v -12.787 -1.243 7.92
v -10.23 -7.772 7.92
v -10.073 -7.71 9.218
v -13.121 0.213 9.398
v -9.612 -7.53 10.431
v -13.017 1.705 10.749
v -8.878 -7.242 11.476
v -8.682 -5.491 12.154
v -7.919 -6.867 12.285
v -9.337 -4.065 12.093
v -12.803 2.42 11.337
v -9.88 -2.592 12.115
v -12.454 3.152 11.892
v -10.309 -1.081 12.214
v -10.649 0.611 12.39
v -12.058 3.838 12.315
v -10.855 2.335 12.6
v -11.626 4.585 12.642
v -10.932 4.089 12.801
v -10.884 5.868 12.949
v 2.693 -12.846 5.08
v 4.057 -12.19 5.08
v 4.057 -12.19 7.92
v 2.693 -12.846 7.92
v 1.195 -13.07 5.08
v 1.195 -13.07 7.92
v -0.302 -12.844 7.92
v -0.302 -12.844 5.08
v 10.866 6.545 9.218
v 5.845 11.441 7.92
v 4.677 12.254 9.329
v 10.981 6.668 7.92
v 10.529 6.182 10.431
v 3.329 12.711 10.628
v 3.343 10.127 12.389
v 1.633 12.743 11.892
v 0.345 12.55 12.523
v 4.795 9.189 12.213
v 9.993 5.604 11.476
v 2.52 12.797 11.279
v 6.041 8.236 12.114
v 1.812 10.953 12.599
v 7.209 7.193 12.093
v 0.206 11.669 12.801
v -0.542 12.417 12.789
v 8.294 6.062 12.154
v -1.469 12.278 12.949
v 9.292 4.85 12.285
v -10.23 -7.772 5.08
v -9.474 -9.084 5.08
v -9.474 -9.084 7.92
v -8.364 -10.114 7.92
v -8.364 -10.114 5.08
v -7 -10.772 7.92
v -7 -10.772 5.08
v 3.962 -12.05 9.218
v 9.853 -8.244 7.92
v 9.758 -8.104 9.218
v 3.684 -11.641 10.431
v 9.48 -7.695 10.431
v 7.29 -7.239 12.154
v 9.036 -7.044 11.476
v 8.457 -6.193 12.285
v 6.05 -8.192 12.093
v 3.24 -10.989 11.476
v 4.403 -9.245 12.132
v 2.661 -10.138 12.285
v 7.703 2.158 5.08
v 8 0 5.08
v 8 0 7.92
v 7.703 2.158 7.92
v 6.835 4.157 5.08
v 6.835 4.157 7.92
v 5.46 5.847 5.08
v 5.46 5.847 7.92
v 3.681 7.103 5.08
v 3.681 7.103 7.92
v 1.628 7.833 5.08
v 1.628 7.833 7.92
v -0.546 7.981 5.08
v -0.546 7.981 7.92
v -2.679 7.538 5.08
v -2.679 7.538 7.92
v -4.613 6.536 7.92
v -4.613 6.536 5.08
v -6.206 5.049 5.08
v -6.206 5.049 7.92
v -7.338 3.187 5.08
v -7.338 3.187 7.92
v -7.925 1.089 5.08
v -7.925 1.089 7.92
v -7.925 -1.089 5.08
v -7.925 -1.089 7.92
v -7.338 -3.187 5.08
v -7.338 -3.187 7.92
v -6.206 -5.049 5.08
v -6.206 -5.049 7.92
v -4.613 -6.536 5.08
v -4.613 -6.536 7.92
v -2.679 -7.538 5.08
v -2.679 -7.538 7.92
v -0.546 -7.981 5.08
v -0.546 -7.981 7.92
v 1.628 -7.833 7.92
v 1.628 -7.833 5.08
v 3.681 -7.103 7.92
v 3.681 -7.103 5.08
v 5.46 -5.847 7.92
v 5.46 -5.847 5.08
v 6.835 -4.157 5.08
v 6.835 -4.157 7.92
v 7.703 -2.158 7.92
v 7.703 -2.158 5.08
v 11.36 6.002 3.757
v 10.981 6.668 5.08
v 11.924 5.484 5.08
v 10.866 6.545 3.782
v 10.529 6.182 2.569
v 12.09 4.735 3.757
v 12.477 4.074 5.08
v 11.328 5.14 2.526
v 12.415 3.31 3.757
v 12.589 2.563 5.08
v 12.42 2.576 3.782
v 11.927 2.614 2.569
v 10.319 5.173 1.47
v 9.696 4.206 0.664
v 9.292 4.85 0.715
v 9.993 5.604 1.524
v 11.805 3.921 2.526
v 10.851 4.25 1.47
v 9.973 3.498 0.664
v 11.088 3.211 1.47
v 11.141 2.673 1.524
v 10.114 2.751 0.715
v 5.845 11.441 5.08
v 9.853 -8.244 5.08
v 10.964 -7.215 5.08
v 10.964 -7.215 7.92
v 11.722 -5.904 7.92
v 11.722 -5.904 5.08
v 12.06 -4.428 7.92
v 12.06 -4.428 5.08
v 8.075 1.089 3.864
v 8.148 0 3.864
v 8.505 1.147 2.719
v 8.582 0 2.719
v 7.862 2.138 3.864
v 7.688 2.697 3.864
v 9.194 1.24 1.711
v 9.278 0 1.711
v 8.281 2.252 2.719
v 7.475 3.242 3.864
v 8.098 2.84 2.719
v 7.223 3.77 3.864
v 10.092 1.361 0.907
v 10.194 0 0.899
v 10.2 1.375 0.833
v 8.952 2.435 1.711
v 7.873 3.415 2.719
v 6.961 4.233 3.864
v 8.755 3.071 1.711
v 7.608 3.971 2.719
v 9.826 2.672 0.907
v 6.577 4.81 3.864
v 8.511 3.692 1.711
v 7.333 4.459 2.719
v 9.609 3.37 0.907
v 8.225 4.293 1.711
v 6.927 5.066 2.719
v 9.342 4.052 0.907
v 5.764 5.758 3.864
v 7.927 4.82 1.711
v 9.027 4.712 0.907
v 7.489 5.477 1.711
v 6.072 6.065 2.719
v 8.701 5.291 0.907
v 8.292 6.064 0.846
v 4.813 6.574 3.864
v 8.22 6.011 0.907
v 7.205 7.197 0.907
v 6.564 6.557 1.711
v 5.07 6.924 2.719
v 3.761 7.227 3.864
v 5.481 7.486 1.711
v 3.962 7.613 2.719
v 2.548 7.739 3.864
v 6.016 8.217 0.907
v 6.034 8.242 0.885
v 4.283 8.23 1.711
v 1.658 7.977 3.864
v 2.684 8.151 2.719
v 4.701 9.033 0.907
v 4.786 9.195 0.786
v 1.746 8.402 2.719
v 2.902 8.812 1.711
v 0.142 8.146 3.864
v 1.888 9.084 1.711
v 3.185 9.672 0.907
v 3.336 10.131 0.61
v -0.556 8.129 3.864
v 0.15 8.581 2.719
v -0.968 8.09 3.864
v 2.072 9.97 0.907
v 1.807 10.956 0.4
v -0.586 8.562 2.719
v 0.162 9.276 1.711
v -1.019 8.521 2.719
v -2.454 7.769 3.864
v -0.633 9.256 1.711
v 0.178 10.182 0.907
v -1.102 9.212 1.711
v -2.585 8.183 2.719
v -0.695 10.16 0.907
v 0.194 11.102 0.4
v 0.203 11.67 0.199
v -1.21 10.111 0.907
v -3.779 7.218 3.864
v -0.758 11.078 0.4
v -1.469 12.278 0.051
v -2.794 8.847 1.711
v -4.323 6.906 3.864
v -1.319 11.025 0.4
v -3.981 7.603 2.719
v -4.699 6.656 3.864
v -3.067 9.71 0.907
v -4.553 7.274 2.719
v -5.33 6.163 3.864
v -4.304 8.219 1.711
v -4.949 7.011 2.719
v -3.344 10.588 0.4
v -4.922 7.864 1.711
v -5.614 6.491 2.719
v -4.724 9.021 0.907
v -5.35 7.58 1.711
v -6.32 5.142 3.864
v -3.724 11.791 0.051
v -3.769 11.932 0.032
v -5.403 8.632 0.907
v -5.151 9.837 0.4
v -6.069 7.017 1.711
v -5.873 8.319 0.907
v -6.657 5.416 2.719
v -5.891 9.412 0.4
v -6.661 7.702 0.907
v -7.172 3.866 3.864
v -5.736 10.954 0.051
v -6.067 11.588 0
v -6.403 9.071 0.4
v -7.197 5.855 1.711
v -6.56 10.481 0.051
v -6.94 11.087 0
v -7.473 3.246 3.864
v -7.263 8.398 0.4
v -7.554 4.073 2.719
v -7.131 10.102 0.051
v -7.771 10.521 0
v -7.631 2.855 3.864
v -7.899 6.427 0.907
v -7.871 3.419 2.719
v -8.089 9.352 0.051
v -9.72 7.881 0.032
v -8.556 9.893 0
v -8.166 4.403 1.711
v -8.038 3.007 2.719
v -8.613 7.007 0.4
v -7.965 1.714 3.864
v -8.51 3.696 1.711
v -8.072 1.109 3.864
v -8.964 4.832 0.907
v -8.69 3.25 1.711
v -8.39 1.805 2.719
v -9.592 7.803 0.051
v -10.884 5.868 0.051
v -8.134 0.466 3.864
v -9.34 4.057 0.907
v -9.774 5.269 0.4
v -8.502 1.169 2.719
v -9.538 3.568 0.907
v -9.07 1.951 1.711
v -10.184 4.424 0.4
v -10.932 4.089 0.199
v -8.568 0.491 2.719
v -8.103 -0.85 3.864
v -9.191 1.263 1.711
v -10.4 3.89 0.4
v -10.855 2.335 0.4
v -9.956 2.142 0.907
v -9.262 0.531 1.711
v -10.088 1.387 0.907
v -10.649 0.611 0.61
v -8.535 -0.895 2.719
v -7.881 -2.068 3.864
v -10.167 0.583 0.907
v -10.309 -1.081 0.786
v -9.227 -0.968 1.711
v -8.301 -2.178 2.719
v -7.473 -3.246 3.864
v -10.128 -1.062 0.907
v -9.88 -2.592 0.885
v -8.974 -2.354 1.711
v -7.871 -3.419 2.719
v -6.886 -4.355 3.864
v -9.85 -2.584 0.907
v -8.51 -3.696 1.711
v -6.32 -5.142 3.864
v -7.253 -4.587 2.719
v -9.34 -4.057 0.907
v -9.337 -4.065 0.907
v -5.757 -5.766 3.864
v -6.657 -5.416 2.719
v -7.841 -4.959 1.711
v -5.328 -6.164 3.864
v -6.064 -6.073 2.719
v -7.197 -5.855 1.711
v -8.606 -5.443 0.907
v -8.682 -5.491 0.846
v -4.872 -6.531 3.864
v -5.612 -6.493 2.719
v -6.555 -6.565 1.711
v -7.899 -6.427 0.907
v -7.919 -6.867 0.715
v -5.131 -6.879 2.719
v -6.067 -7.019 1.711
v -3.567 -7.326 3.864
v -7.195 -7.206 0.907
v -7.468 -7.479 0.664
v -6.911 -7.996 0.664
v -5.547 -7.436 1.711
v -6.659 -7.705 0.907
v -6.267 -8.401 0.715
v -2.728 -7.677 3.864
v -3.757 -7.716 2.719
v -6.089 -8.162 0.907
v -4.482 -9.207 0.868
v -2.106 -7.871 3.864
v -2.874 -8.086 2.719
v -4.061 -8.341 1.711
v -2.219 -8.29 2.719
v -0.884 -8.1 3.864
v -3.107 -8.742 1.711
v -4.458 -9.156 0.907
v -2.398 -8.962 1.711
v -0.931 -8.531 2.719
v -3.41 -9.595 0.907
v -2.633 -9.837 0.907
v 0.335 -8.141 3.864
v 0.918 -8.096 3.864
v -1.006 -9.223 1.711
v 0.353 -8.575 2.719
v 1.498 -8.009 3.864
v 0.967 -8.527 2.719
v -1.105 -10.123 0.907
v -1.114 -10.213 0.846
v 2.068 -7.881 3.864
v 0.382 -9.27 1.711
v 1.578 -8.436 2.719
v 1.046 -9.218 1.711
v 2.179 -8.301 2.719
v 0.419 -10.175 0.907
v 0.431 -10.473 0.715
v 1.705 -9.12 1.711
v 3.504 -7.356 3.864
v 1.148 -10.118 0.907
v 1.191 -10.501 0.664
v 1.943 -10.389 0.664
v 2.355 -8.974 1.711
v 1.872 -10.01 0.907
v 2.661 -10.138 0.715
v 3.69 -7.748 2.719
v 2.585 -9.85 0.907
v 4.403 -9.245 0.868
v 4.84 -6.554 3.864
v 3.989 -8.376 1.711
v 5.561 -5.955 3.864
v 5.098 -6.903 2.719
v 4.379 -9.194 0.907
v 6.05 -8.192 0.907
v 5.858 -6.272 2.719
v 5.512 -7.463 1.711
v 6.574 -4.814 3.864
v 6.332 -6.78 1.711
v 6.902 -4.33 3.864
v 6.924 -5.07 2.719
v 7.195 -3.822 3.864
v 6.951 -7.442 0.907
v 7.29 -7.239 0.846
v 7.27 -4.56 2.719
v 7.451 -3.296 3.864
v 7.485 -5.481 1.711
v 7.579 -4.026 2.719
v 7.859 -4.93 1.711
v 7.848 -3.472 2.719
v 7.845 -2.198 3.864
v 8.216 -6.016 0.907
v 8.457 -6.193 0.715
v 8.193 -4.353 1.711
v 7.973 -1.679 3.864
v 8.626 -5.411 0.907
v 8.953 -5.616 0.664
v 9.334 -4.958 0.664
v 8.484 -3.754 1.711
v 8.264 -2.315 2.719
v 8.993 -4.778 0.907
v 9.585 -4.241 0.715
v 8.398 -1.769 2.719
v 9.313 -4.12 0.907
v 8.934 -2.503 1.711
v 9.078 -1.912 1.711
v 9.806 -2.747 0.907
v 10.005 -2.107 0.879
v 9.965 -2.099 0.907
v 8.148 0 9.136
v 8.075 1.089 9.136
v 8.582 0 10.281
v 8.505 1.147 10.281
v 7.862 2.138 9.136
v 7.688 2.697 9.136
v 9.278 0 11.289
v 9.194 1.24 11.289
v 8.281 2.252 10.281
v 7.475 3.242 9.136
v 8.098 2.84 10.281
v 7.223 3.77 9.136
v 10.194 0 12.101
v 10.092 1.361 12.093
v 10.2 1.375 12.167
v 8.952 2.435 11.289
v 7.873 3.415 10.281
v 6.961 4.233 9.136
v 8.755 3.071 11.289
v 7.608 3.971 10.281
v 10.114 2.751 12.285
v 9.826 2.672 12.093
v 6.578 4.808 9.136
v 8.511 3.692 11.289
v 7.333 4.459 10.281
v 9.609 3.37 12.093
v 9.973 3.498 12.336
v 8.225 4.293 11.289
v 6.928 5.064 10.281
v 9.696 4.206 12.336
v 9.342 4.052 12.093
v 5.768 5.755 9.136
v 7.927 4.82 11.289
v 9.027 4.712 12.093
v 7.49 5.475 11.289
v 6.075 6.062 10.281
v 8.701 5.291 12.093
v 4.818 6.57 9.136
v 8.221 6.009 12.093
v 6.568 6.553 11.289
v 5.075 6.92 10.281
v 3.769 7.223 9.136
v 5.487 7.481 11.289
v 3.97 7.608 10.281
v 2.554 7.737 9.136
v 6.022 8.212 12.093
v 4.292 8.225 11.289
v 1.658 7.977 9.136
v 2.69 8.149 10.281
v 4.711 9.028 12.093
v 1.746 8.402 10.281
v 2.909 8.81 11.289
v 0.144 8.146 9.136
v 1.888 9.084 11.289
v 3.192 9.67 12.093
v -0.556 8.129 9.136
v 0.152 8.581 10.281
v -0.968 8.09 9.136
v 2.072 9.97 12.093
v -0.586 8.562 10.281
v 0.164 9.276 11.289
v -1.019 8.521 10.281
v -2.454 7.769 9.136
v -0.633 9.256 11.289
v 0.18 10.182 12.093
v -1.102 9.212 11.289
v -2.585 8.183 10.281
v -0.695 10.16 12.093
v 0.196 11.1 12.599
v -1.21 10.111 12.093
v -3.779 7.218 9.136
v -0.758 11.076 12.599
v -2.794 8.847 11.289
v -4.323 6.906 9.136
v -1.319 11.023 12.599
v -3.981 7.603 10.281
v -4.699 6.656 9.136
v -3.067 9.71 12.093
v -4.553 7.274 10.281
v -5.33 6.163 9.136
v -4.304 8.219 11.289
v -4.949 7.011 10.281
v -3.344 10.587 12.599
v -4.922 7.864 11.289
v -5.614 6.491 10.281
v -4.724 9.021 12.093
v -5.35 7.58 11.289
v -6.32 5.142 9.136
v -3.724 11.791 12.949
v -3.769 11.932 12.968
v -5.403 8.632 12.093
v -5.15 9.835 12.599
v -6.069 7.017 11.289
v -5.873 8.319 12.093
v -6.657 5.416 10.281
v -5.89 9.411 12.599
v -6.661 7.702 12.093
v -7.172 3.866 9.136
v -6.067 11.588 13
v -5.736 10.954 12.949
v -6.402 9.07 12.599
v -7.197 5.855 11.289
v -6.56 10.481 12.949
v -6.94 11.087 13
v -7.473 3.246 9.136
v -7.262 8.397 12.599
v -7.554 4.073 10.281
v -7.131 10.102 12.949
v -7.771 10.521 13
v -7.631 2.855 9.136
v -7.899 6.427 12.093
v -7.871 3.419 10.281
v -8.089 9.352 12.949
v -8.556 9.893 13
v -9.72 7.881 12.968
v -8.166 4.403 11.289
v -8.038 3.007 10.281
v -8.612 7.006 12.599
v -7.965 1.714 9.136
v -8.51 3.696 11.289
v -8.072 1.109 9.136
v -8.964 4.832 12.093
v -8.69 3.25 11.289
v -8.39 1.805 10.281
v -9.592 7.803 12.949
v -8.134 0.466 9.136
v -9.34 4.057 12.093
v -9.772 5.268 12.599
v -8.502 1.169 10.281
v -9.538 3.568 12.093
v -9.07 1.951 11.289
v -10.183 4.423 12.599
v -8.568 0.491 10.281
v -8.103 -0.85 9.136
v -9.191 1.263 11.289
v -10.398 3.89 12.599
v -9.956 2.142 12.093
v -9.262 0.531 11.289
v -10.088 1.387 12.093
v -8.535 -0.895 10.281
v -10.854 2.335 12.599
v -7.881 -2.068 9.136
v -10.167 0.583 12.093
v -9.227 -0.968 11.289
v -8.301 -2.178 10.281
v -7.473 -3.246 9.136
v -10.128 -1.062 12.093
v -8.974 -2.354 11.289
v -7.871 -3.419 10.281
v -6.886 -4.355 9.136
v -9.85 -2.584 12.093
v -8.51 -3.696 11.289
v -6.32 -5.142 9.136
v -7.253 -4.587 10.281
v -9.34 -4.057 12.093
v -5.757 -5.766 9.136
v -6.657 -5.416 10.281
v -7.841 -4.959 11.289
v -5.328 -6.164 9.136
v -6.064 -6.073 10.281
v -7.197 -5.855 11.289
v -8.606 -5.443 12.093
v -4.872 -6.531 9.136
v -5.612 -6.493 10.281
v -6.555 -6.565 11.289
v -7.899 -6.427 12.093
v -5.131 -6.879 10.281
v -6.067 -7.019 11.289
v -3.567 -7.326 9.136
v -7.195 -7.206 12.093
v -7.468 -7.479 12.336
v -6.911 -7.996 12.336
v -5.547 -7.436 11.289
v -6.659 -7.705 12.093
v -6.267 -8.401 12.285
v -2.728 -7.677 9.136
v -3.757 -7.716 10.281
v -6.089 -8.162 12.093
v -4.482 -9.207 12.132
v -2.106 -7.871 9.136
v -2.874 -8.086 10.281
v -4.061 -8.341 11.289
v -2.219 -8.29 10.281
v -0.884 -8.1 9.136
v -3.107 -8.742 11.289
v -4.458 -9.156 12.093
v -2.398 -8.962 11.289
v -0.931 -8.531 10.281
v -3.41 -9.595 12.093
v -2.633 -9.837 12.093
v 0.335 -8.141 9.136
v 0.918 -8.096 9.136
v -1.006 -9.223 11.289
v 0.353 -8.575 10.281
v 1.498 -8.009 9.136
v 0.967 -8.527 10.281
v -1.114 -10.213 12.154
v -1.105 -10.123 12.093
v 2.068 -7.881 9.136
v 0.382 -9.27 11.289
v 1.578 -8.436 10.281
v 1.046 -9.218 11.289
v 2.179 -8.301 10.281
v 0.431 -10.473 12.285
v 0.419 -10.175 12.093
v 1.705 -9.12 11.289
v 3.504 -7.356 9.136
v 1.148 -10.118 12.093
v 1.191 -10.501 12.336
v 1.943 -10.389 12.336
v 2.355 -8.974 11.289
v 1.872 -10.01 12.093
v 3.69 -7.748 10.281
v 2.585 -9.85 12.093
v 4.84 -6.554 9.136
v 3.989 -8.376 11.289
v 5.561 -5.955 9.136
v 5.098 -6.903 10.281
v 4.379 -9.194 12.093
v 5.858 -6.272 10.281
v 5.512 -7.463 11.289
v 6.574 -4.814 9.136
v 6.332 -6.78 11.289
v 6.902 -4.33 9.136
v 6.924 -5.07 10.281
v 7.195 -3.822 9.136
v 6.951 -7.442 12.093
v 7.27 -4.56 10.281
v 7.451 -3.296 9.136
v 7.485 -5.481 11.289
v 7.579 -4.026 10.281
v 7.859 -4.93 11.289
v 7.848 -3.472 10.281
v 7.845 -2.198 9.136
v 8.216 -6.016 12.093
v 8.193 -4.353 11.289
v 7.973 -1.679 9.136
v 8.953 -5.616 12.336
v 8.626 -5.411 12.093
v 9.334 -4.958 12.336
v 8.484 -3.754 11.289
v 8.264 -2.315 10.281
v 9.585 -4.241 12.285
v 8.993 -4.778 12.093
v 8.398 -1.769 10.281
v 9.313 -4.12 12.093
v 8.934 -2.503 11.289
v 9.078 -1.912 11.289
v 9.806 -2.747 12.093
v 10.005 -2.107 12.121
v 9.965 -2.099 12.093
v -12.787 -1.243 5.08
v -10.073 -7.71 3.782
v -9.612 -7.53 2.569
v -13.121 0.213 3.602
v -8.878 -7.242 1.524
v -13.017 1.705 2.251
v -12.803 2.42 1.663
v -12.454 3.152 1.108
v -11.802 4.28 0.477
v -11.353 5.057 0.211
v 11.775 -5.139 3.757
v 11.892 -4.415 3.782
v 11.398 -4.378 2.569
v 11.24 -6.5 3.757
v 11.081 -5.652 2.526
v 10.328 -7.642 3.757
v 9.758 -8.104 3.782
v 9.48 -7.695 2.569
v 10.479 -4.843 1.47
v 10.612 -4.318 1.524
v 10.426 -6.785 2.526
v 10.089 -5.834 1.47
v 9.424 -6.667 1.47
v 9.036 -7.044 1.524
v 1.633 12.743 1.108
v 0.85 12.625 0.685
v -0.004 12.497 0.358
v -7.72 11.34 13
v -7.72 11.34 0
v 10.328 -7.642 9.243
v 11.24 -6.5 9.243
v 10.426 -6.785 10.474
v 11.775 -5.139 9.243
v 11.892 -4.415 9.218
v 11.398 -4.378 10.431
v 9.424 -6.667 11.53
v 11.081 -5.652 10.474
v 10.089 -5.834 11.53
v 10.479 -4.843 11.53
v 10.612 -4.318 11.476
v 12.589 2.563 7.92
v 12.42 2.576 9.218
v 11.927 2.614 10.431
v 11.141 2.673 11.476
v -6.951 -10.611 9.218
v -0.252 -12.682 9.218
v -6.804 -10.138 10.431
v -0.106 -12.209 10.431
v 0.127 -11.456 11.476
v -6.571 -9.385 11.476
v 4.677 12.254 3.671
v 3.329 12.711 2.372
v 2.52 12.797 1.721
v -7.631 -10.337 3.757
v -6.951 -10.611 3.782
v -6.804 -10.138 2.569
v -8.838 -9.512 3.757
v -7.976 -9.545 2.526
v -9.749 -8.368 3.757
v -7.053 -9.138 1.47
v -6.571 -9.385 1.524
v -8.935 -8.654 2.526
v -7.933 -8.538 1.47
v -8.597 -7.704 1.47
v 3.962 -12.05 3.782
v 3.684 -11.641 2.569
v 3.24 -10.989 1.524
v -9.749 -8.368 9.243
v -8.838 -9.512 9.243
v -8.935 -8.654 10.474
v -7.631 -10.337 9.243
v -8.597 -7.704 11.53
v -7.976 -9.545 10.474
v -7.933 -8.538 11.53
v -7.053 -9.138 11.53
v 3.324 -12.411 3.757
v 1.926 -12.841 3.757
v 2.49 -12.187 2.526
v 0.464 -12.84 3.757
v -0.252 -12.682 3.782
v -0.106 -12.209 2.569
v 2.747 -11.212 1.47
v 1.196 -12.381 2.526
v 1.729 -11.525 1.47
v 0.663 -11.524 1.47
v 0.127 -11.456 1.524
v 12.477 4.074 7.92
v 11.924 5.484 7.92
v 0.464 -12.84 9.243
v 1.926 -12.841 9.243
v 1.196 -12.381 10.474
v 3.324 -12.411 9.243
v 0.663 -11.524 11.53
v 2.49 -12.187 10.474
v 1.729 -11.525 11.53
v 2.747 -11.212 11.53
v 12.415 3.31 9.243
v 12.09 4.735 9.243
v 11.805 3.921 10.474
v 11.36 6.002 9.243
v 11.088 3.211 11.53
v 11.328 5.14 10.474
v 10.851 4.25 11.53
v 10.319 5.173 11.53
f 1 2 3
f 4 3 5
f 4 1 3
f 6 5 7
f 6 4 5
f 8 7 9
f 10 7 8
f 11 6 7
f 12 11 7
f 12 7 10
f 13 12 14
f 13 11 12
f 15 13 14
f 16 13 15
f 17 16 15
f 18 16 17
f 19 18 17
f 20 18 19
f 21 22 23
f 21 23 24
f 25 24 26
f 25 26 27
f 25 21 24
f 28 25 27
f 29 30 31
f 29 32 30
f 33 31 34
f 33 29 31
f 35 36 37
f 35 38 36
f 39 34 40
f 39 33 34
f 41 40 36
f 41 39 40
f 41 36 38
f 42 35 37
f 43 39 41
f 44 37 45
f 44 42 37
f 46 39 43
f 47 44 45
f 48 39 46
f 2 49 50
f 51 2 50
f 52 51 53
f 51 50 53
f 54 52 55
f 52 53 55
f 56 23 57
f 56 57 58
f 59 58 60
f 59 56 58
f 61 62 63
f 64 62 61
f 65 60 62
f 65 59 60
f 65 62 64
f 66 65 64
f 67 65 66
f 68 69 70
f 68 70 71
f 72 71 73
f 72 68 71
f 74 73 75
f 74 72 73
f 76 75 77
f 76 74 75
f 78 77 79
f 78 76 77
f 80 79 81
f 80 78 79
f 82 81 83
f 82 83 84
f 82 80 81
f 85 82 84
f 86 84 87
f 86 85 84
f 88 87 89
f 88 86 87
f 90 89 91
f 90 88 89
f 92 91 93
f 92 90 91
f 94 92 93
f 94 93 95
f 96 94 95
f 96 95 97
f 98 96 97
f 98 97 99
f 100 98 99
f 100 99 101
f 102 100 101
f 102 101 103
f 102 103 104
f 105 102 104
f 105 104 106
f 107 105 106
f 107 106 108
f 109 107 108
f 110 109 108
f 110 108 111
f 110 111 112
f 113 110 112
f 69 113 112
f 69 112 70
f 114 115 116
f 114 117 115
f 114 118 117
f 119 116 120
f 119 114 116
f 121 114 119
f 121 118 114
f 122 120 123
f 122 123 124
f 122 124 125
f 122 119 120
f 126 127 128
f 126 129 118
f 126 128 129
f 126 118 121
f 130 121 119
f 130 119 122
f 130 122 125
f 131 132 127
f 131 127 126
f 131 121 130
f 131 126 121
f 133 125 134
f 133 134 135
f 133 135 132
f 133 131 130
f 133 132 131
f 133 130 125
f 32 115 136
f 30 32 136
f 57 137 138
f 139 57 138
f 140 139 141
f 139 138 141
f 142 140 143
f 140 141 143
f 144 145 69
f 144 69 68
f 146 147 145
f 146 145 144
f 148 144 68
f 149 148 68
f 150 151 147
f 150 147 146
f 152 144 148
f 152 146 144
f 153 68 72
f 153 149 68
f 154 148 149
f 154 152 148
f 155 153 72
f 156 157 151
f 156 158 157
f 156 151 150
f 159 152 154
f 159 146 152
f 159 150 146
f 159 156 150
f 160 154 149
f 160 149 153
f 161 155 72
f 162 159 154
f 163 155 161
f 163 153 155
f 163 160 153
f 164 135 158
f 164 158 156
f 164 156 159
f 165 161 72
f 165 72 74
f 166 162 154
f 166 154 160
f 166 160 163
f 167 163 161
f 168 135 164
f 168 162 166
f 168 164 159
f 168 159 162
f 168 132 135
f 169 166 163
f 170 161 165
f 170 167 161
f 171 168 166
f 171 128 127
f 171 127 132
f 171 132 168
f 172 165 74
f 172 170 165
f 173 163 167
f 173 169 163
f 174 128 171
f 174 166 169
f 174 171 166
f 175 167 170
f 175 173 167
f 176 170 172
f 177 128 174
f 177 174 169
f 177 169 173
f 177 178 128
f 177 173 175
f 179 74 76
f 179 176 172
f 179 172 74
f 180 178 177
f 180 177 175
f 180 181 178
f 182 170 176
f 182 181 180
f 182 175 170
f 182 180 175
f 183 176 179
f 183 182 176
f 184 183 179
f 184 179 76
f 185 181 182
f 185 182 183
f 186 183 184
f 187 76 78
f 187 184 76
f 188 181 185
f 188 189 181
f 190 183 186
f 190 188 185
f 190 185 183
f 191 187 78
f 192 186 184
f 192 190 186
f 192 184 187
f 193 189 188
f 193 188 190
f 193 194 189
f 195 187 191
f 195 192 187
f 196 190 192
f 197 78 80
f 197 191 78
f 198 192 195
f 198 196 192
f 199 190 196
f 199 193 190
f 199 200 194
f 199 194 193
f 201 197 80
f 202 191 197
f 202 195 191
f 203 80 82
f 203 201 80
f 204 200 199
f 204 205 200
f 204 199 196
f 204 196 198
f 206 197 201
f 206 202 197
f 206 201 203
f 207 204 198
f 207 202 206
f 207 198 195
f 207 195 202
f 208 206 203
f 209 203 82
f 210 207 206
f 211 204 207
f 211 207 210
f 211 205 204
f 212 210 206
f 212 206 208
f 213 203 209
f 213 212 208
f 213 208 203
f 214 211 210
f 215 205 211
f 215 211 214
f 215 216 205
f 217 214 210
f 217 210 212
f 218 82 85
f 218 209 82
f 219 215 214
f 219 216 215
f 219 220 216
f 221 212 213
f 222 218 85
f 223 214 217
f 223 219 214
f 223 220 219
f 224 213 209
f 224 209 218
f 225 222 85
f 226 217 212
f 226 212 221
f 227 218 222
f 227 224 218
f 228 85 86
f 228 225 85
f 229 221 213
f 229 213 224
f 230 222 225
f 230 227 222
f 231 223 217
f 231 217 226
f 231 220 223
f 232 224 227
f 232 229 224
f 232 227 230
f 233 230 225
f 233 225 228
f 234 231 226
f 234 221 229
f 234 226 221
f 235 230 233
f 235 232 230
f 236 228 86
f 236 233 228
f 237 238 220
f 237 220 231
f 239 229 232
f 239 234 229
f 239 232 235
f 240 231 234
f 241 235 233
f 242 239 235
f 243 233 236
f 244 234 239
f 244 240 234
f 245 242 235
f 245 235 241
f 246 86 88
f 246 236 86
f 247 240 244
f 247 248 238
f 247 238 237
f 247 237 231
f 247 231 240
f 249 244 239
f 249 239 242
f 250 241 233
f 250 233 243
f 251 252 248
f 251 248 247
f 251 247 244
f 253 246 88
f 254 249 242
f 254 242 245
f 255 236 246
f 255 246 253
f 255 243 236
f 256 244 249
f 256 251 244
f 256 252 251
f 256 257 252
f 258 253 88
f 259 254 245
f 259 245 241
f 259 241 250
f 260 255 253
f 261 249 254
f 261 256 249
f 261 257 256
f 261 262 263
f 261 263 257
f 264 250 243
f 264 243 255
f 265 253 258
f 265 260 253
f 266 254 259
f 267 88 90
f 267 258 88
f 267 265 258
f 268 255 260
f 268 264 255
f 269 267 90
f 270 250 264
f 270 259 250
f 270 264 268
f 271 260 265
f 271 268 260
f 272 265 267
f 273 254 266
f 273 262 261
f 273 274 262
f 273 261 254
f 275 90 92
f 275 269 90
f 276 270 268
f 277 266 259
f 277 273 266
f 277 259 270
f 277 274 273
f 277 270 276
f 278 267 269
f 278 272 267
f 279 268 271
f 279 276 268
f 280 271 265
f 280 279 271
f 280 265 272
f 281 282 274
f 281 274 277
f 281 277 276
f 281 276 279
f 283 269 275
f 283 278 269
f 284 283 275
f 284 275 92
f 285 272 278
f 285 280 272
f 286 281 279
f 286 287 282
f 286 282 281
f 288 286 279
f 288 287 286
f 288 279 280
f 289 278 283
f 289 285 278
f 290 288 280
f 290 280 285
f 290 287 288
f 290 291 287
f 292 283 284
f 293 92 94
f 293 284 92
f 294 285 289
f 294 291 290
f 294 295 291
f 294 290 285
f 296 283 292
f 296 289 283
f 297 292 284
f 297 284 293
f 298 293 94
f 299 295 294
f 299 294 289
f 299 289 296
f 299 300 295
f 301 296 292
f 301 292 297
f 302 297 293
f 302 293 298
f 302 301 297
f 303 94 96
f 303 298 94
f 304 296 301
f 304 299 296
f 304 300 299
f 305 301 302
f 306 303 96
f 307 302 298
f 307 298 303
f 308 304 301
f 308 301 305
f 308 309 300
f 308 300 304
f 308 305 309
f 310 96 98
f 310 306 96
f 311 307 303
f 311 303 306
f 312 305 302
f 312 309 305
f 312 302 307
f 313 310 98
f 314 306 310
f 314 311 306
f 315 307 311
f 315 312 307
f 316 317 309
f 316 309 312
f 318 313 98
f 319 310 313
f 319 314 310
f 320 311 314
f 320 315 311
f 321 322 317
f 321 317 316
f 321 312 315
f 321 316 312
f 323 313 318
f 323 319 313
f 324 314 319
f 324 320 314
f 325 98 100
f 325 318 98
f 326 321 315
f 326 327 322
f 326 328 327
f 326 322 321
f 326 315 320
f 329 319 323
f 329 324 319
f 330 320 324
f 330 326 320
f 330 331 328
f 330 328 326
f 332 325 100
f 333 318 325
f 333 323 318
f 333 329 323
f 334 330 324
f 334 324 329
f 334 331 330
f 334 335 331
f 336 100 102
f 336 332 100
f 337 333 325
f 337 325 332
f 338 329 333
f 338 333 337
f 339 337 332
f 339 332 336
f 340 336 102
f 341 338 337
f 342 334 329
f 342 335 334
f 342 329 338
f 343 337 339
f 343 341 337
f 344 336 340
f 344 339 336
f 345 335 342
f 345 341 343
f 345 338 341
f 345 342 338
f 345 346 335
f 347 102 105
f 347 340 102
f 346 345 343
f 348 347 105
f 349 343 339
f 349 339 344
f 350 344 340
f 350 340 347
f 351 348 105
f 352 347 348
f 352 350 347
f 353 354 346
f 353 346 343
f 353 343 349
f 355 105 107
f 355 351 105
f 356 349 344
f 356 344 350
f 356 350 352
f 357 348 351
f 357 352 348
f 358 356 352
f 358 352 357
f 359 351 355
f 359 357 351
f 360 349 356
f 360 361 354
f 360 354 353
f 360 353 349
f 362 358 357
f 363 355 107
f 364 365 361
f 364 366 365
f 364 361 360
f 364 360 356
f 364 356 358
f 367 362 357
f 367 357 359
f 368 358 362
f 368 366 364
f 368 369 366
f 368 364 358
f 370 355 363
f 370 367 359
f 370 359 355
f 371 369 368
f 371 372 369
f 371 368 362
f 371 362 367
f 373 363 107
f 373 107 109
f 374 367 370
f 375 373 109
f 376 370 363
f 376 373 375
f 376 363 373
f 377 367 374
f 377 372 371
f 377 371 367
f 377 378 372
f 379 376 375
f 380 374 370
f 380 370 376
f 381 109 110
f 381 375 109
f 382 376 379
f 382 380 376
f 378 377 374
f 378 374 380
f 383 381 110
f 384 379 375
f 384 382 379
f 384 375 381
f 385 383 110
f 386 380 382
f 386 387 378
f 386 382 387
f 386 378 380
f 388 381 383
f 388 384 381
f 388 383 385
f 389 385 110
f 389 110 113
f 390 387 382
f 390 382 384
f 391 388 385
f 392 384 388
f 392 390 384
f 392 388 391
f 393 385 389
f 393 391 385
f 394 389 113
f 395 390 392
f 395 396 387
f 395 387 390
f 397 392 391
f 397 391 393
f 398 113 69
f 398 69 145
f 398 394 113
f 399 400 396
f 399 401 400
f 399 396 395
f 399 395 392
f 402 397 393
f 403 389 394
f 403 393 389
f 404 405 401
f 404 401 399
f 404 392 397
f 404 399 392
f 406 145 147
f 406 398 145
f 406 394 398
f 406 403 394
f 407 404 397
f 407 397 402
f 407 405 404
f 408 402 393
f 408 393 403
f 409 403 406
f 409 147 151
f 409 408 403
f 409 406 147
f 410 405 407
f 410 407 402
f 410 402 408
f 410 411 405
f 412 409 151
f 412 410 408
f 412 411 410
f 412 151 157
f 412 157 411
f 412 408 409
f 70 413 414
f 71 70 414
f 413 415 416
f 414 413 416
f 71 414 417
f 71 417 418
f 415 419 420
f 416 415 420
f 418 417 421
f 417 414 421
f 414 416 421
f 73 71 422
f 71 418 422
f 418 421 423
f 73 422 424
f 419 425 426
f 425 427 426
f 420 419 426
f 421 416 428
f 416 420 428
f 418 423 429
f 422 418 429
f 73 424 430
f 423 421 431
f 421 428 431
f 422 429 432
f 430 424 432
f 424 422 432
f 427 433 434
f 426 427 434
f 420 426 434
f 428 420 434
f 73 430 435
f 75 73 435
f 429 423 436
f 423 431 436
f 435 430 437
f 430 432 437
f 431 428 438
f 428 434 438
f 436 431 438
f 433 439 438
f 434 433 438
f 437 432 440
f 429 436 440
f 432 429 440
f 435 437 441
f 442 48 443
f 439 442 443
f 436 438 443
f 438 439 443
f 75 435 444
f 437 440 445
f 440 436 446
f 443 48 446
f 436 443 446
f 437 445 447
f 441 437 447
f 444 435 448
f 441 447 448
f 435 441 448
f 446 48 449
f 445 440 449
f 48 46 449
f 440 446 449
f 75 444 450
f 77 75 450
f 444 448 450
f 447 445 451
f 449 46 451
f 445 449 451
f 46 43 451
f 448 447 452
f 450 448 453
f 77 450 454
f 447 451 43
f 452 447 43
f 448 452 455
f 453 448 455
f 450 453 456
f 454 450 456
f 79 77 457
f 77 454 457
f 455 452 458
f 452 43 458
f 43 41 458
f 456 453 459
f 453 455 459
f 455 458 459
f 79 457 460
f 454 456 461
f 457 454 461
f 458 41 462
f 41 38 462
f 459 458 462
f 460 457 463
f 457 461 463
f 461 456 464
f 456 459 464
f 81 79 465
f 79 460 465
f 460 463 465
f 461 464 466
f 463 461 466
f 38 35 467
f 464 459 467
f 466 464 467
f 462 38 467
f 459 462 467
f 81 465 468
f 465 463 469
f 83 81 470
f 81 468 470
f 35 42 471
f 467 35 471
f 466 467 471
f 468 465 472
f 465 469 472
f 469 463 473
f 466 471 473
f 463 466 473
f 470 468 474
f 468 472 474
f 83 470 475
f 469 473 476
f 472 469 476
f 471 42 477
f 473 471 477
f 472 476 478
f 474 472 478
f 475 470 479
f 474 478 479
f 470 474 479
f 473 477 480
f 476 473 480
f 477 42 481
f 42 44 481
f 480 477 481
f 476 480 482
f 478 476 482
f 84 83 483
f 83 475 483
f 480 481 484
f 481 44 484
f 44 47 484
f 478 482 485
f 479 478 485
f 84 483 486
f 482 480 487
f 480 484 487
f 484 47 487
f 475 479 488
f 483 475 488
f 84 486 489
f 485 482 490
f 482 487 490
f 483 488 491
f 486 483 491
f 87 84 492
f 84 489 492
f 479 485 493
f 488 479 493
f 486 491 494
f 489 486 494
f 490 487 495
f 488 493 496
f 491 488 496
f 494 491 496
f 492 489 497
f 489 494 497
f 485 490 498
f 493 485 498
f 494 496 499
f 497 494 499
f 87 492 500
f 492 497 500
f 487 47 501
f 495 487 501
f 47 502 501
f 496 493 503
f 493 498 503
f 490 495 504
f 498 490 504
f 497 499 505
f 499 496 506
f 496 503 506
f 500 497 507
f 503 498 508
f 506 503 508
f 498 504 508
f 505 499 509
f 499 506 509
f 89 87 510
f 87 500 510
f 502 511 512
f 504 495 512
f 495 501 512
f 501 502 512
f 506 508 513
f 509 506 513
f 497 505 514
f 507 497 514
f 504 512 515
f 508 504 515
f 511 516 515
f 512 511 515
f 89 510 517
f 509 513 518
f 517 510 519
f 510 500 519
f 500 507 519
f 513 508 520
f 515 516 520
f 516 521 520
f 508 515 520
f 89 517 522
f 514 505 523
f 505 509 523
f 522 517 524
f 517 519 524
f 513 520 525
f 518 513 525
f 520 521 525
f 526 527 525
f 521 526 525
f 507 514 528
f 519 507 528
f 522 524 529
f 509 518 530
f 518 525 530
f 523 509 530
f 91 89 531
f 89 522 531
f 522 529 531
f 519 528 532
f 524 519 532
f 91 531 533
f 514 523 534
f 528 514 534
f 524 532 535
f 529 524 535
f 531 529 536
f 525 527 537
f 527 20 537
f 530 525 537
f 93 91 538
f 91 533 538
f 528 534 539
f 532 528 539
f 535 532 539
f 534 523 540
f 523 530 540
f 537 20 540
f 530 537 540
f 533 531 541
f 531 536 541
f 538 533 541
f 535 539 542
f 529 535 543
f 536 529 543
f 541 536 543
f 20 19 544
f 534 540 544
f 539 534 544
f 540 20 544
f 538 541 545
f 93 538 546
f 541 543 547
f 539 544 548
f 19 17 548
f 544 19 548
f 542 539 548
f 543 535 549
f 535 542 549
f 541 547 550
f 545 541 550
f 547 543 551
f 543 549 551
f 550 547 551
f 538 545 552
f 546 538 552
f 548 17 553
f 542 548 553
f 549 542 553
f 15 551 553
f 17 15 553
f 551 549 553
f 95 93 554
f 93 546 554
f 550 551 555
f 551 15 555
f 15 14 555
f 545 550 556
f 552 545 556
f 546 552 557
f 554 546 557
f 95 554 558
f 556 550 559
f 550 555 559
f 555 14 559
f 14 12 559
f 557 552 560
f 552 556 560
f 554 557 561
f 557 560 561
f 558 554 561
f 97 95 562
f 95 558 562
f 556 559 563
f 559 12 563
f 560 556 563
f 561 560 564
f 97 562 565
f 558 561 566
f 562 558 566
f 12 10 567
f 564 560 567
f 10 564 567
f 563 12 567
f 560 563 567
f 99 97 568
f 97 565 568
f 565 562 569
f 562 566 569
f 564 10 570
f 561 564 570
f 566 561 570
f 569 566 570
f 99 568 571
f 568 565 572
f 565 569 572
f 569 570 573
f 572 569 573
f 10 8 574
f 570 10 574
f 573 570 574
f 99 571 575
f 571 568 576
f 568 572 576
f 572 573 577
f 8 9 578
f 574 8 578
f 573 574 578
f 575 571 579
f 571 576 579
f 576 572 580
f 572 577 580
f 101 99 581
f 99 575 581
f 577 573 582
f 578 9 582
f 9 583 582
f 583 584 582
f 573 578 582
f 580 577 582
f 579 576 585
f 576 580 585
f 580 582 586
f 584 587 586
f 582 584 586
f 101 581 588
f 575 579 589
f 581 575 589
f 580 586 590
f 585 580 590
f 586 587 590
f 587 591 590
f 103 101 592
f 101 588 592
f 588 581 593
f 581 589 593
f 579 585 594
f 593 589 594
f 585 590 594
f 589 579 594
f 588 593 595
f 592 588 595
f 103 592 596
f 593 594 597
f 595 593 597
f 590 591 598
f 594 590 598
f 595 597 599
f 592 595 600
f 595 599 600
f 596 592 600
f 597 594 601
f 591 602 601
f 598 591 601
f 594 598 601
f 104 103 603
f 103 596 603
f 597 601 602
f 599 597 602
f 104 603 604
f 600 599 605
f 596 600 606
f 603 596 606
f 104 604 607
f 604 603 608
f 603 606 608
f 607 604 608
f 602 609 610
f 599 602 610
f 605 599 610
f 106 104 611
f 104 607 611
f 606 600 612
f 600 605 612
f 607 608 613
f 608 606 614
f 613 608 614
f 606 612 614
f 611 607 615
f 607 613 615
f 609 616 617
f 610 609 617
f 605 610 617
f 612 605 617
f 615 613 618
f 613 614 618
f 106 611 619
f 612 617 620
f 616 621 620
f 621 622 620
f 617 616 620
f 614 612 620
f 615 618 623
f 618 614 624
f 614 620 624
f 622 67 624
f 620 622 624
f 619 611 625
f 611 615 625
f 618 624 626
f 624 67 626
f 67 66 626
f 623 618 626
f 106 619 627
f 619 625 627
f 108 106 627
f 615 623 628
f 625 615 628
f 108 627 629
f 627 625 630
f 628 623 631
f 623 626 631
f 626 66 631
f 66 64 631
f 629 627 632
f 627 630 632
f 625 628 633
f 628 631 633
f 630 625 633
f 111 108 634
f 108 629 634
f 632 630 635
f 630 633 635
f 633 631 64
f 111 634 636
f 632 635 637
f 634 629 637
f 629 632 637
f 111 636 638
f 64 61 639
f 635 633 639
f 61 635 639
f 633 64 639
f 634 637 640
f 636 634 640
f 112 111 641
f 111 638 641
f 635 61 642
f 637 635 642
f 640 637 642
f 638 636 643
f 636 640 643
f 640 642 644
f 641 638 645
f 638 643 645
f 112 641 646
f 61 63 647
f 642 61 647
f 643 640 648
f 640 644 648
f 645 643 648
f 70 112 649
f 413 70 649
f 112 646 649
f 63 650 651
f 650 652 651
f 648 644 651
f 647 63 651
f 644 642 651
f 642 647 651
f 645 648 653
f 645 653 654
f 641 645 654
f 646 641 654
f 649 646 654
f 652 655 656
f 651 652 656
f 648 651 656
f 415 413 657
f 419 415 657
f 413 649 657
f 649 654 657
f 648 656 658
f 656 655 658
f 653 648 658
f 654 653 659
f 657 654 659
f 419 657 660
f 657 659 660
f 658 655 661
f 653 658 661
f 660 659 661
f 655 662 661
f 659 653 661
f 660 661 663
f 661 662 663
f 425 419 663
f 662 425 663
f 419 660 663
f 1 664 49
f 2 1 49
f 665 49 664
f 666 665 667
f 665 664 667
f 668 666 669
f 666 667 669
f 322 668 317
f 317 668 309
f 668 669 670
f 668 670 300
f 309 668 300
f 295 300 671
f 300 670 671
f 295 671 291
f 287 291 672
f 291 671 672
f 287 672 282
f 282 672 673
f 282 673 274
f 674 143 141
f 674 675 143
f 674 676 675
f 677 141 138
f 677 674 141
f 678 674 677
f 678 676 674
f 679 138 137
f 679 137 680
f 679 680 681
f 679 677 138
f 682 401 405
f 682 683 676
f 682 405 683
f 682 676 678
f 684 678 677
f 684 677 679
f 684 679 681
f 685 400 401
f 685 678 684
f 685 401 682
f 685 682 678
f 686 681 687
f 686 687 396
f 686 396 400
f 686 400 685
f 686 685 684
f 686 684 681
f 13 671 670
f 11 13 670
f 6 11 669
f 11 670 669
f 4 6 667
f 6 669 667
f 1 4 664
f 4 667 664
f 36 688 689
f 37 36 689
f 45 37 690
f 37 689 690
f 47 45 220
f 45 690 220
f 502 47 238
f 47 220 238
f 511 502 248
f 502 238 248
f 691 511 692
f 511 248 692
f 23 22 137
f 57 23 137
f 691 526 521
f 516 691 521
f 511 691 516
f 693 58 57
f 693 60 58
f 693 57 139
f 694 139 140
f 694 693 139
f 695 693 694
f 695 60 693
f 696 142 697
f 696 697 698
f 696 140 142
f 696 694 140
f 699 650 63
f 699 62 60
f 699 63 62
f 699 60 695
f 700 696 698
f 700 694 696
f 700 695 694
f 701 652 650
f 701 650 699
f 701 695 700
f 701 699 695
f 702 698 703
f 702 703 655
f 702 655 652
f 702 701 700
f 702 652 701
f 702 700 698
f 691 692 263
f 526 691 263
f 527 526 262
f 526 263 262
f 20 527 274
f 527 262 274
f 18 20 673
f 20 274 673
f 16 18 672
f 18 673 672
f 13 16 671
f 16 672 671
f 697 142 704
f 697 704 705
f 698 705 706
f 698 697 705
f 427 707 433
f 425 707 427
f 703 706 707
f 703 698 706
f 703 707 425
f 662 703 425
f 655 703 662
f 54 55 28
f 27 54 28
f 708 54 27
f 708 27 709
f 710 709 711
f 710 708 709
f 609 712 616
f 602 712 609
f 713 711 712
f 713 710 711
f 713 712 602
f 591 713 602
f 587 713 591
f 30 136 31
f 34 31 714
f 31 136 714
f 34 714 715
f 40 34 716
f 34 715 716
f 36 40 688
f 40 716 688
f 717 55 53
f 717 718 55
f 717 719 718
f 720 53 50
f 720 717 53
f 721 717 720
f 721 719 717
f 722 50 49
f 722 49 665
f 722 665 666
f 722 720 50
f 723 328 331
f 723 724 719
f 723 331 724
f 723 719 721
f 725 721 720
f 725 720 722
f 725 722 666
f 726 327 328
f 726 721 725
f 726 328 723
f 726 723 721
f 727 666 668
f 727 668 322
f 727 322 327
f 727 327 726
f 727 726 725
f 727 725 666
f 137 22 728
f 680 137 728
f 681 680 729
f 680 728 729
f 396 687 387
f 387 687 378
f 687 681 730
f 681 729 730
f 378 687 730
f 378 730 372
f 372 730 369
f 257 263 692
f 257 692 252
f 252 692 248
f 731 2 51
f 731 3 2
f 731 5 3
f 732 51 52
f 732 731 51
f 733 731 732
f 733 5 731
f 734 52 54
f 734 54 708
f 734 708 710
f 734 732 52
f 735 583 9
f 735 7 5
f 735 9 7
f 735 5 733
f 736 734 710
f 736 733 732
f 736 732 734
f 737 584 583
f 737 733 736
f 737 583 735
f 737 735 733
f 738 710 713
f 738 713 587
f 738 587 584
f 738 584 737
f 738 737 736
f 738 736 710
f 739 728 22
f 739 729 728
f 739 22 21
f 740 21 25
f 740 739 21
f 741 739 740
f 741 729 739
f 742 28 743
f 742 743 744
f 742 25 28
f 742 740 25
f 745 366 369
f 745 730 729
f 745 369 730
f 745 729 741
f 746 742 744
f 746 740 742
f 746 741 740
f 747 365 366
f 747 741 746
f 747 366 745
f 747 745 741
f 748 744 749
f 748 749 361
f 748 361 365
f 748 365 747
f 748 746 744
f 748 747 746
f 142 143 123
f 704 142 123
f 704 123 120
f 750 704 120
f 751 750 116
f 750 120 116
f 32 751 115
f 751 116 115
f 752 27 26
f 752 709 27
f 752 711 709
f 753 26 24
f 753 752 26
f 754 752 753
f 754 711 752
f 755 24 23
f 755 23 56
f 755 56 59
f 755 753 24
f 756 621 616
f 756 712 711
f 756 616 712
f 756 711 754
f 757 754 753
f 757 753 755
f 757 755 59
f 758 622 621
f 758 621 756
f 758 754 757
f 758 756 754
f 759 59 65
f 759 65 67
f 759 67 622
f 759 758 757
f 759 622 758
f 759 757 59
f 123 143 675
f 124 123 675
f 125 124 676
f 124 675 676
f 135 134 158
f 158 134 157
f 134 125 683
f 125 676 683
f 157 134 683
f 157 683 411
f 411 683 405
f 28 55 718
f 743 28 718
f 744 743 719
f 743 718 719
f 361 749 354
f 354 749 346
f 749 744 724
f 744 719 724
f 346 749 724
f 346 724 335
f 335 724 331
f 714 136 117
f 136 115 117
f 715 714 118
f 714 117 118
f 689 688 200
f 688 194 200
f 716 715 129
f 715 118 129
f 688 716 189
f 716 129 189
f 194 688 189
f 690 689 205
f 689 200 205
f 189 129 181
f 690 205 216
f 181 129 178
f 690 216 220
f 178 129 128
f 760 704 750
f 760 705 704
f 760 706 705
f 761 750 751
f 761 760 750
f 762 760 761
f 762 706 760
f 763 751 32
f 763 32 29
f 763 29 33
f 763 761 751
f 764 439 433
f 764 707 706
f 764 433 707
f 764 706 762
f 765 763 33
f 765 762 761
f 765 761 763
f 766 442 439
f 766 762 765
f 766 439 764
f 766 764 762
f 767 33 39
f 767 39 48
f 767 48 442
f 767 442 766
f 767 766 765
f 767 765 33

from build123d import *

# Parameters (mm, degrees)
F0_R         = 8
F1_DEPTH     = 13
F2_T1_DEPTH  = 2.84
F2_T3_DEPTH  = 7.0113068008
F2_T5_DEPTH  = 7.0113068008
F2_T7_DEPTH  = 7.0113068008
F2_T9_DEPTH  = 25.2319953177
F2_T11_DEPTH = 22.1577058643
F2_T13_DEPTH = 22.1577058643
F2_T18_DEPTH = 5.08
F2_T24_DEPTH = 5.08
F2_T30_DEPTH = 5.08
F2_T36_DEPTH = 5.08
F2_T42_DEPTH = 5.08
F2_T48_DEPTH = 5.08
F2_T54_DEPTH = 5.08
F2_T60_DEPTH = 5.08


# Not quite as in the source:
# - a fillet or chamfer that OpenCascade refuses, or shapes differently, is made with other operations: its cross-section is extruded or revolved along the edge and cut away or added


with BuildPart() as f1:
    # F0 (on Top) → F1 (new body)
    with BuildSketch(Plane.XY):
        Polygon((-7.71981316, 11.3397637924), (-13.6790091142, 1.0346341127), (-9.3376322044, -10.0495961565), (2.0351722083, -13.5662755455), (11.8754504382, -6.8672727471), (12.7732722731, 5.0029264966), (4.0525595591, 13.1058200473), align=None)
        Circle(F0_R, mode=Mode.SUBTRACT)
    extrude(amount=F1_DEPTH)

    # F2: fillet of radius 5.08 on 19 edges, made by hand

    # F2_s2 → F2_t1 (cut)
    with BuildSketch(Plane.XY.offset(5.08)):
        with BuildLine():
            ThreePointArc((-10.2298236351, -7.7716886015), (-8.9575574192, -9.6405419105), (-7.0004201054, -10.7723049377))
            Line((-7.0004201054, -10.7723049377), (-9.3376322044, -10.0495961565))
            Line((-9.3376322044, -10.0495961565), (-10.2298236351, -7.7716886015))
        make_face()
        with BuildLine():
            ThreePointArc((4.0574365946, -12.1895711001), (1.9523334733, -13.0140799619), (-0.3020398907, -12.8435667642))
            Line((-0.3020398907, -12.8435667642), (2.0351722083, -13.5662755455))
            Line((2.0351722083, -13.5662755455), (4.0574365946, -12.1895711001))
        make_face()
        with BuildLine():
            ThreePointArc((9.8531860519, -8.2439771925), (11.39207744, -6.5877503632), (12.0599607822, -4.4278416022))
            Line((12.0599607822, -4.4278416022), (11.8754504382, -6.8672727471))
            Line((11.8754504382, -6.8672727471), (9.8531860519, -8.2439771925))
        make_face()
        with BuildLine():
            ThreePointArc((12.588761929, 2.5634953517), (12.2533547384, 4.7992896247), (10.9810885225, 6.6681429337))
            Line((10.9810885225, 6.6681429337), (12.7732722731, 5.0029264966))
            Line((12.7732722731, 5.0029264966), (12.588761929, 2.5634953517))
        make_face()
    extrude(amount=F2_T1_DEPTH, mode=Mode.SUBTRACT)

    # F2_s4 → F2_t3 (cut)
    with BuildSketch(Plane(origin=(-3.3491901073, 1.0356309133, 0), x_dir=(0, 0, 1), z_dir=(0.9553682937, -0.2954173716, 0))):
        with BuildLine():
            ThreePointArc((5.08, 12.3595642949), (1.4878975516, 10.8716667433), (0, 7.2795642949))
            Line((0, 7.2795642949), (0, 12.3595642949))
            Line((0, 12.3595642949), (5.08, 12.3595642949))
        make_face()
        with BuildLine():
            ThreePointArc((7.92, 12.3595642949), (11.5121024484, 10.8716667433), (13, 7.2795642949))
            Line((13, 7.2795642949), (13, 12.3595642949))
            Line((13, 12.3595642949), (7.92, 12.3595642949))
        make_face()
    extrude(amount=F2_T3_DEPTH, mode=Mode.SUBTRACT)

    # F2_s6 → F2_t5 (cut)
    with BuildSketch(Plane(origin=(-2.8978747286, -1.9727969538, 0), x_dir=(0, 0, 1), z_dir=(0.8266289897, 0.5627472909, 0))):
        with BuildLine():
            ThreePointArc((5.08, 12.3595642949), (1.4878975516, 10.8716667433), (0, 7.2795642949))
            Line((0, 7.2795642949), (0, 12.3595642949))
            Line((0, 12.3595642949), (5.08, 12.3595642949))
        make_face()
        with BuildLine():
            ThreePointArc((7.92, 12.3595642949), (11.5121024484, 10.8716667433), (13, 7.2795642949))
            Line((13, 7.2795642949), (13, 12.3595642949))
            Line((13, 12.3595642949), (7.92, 12.3595642949))
        make_face()
    extrude(amount=F2_T5_DEPTH, mode=Mode.SUBTRACT)

    # F2_s8 → F2_t7 (cut)
    with BuildSketch(Plane(origin=(-0.2644005734, -3.4956684769, 0), x_dir=(0, 0, 1), z_dir=(0.0754211963, 0.9971517654, 0))):
        with BuildLine():
            ThreePointArc((5.08, 12.3595642949), (1.4878975516, 10.8716667433), (0, 7.2795642949))
            Line((0, 7.2795642949), (0, 12.3595642949))
            Line((0, 12.3595642949), (5.08, 12.3595642949))
        make_face()
        with BuildLine():
            ThreePointArc((7.92, 12.3595642949), (11.5121024484, 10.8716667433), (13, 7.2795642949))
            Line((13, 7.2795642949), (13, 12.3595642949))
            Line((13, 12.3595642949), (7.92, 12.3595642949))
        make_face()
    extrude(amount=F2_T7_DEPTH, mode=Mode.SUBTRACT)

    # F2_s10 → F2_t9 (cut)
    with BuildSketch(Plane.XY.offset(-6.1159976589)):
        with BuildLine():
            ThreePointArc((-12.4543415319, 3.1524295918), (-13.1222248741, 0.9925208307), (-12.7868176835, -1.2432734423))
            Line((-12.7868176835, -1.2432734423), (-13.6790091142, 1.0346341127))
            Line((-13.6790091142, 1.0346341127), (-12.4543415319, 3.1524295918))
        make_face()
        with BuildLine():
            ThreePointArc((5.8447433097, 11.4406036103), (3.8876059959, 12.5723666375), (1.6332326319, 12.7428798351))
            Line((1.6332326319, 12.7428798351), (4.0525595591, 13.1058200473))
            Line((4.0525595591, 13.1058200473), (5.8447433097, 11.4406036103))
        make_face()
    extrude(amount=F2_T9_DEPTH, mode=Mode.SUBTRACT)

    # F2_s12 → F2_t11 (cut)
    with BuildSketch(Plane(origin=(-6.802324944, 17.367424578, 0), x_dir=(0, 0, 1), z_dir=(0.3646957865, -0.9311267278, 0))):
        with BuildLine():
            ThreePointArc((5.08, 12.3595642949), (1.4878975516, 10.8716667433), (0, 7.2795642949))
            Line((0, 7.2795642949), (0, 12.3595642949))
            Line((0, 12.3595642949), (5.08, 12.3595642949))
        make_face()
        with BuildLine():
            ThreePointArc((7.92, 12.3595642949), (11.5121024484, 10.8716667433), (13, 7.2795642949))
            Line((13, 7.2795642949), (13, 12.3595642949))
            Line((13, 12.3595642949), (7.92, 12.3595642949))
        make_face()
    extrude(amount=F2_T11_DEPTH, mode=Mode.SUBTRACT)

    # F2_s14 → F2_t13 (cut)
    with BuildSketch(Plane(origin=(2.5681726064, -2.3862303383, 0), x_dir=(0, 0, 1), z_dir=(-0.7325802962, 0.6806806223, 0))):
        with BuildLine():
            ThreePointArc((5.08, 12.3595642949), (1.4878975516, 10.8716667433), (0, 7.2795642949))
            Line((0, 7.2795642949), (0, 12.3595642949))
            Line((0, 12.3595642949), (5.08, 12.3595642949))
        make_face()
        with BuildLine():
            ThreePointArc((7.92, 12.3595642949), (11.5121024484, 10.8716667433), (13, 7.2795642949))
            Line((13, 7.2795642949), (13, 12.3595642949))
            Line((13, 12.3595642949), (7.92, 12.3595642949))
        make_face()
    extrude(amount=F2_T13_DEPTH, mode=Mode.SUBTRACT)


with BuildPart() as f2_tool16:
    # F2_s17 → F2_t18 (new body)
    with BuildSketch(Plane.XY.offset(5.08)):
        Polygon((-5.4996998577, -5.9190340058), (-10.2298236351, -7.7716886015), (-9.3376322044, -10.0495961565), (-7.0004201054, -10.7723049377), align=None)
    extrude(amount=-F2_T18_DEPTH)

    # F2_s19 → F2_t20 (revolve, cut)
    with BuildSketch(Plane(origin=(-5.4996998577, -5.9190340058, 5.08), x_dir=(0.6806806223, 0.7325802962, 0), z_dir=(-0.7325802962, 0.6806806223, 0))):
        with BuildLine():
            ThreePointArc((0, -5.08), (5.08, 0), (0, 5.08))
            Line((0, 5.08), (0, -5.08))
        make_face()
    revolve(axis=Axis((-5.4996998577, -5.9190340058, 5.08), (0, 0, -1)), mode=Mode.SUBTRACT)


with BuildPart() as f1_1:
    add(f1.part)

    # F2_t15: cut F2_tool16
    add(f2_tool16.part, mode=Mode.SUBTRACT)


with BuildPart() as f2_tool22:
    # F2_s23 → F2_t24 (new body)
    with BuildSketch(Plane.XY.offset(7.92)):
        Polygon((-5.4996998577, -5.9190340058), (-10.2298236351, -7.7716886015), (-9.3376322044, -10.0495961565), (-7.0004201054, -10.7723049377), align=None)
    extrude(amount=F2_T24_DEPTH)

    # F2_s25 → F2_t26 (revolve, cut)
    with BuildSketch(Plane(origin=(-5.4996998577, -5.9190340058, 7.92), x_dir=(0.6806806223, 0.7325802962, 0), z_dir=(0.7325802962, -0.6806806223, 0))):
        with BuildLine():
            ThreePointArc((0, -5.08), (5.08, 0), (0, 5.08))
            Line((0, 5.08), (0, -5.08))
        make_face()
    revolve(axis=Axis((-5.4996998577, -5.9190340058, 7.92), (0, 0, 1)), mode=Mode.SUBTRACT)


with BuildPart() as f1_2:
    add(f1_1.part)

    # F2_t21: cut F2_tool22
    add(f2_tool22.part, mode=Mode.SUBTRACT)


with BuildPart() as f2_tool28:
    # F2_s29 → F2_t30 (new body)
    with BuildSketch(Plane.XY.offset(5.08)):
        Polygon((1.198680357, -7.9902958324), (-0.3020398907, -12.8435667642), (2.0351722083, -13.5662755455), (4.0574365946, -12.1895711001), align=None)
    extrude(amount=-F2_T30_DEPTH)

    # F2_s31 → F2_t32 (revolve, cut)
    with BuildSketch(Plane(origin=(1.198680357, -7.9902958324, 5.08), x_dir=(-0.1483569126, 0.9889338838, 0), z_dir=(-0.9889338838, -0.1483569126, 0))):
        with BuildLine():
            ThreePointArc((0, -5.08), (5.08, 0), (0, 5.08))
            Line((0, 5.08), (0, -5.08))
        make_face()
    revolve(axis=Axis((1.198680357, -7.9902958324, 5.08), (0, 0, -1)), mode=Mode.SUBTRACT)


with BuildPart() as f1_3:
    add(f1_2.part)

    # F2_t27: cut F2_tool28
    add(f2_tool28.part, mode=Mode.SUBTRACT)


with BuildPart() as f2_tool34:
    # F2_s35 → F2_t36 (new body)
    with BuildSketch(Plane.XY.offset(7.92)):
        Polygon((1.198680357, -7.9902958324), (-0.3020398907, -12.8435667642), (2.0351722083, -13.5662755455), (4.0574365946, -12.1895711001), align=None)
    extrude(amount=F2_T36_DEPTH)

    # F2_s37 → F2_t38 (revolve, cut)
    with BuildSketch(Plane(origin=(1.198680357, -7.9902958324, 7.92), x_dir=(-0.1483569126, 0.9889338838, 0), z_dir=(0.9889338838, 0.1483569126, 0))):
        with BuildLine():
            ThreePointArc((0, -5.08), (5.08, 0), (0, 5.08))
            Line((0, 5.08), (0, -5.08))
        make_face()
    revolve(axis=Axis((1.198680357, -7.9902958324, 7.92), (0, 0, 1)), mode=Mode.SUBTRACT)


with BuildPart() as f1_4:
    add(f1_3.part)

    # F2_t33: cut F2_tool34
    add(f2_tool34.part, mode=Mode.SUBTRACT)


with BuildPart() as f2_tool40:
    # F2_s41 → F2_t42 (new body)
    with BuildSketch(Plane.XY.offset(5.08)):
        Polygon((6.9944298143, -4.0447019248), (9.8531860519, -8.2439771925), (11.8754504382, -6.8672727471), (12.0599607822, -4.4278416022), align=None)
    extrude(amount=-F2_T42_DEPTH)

    # F2_s43 → F2_t44 (revolve, cut)
    with BuildSketch(Plane(origin=(6.9944298143, -4.0447019248, 5.08), x_dir=(-0.8656786665, 0.5006000863, 0), z_dir=(-0.5006000863, -0.8656786665, 0))):
        with BuildLine():
            ThreePointArc((0, -5.08), (5.08, 0), (0, 5.08))
            Line((0, 5.08), (0, -5.08))
        make_face()
    revolve(axis=Axis((6.9944298143, -4.0447019248, 5.08), (0, 0, -1)), mode=Mode.SUBTRACT)


with BuildPart() as f1_5:
    add(f1_4.part)

    # F2_t39: cut F2_tool40
    add(f2_tool40.part, mode=Mode.SUBTRACT)


with BuildPart() as f2_tool46:
    # F2_s47 → F2_t48 (new body)
    with BuildSketch(Plane.XY.offset(7.92)):
        Polygon((6.9944298143, -4.0447019248), (9.8531860519, -8.2439771925), (11.8754504382, -6.8672727471), (12.0599607822, -4.4278416022), align=None)
    extrude(amount=F2_T48_DEPTH)

    # F2_s49 → F2_t50 (revolve, cut)
    with BuildSketch(Plane(origin=(6.9944298143, -4.0447019248, 7.92), x_dir=(-0.8656786665, 0.5006000863, 0), z_dir=(0.5006000863, 0.8656786665, 0))):
        with BuildLine():
            ThreePointArc((0, -5.08), (5.08, 0), (0, 5.08))
            Line((0, 5.08), (0, -5.08))
        make_face()
    revolve(axis=Axis((6.9944298143, -4.0447019248, 7.92), (0, 0, 1)), mode=Mode.SUBTRACT)


with BuildPart() as f1_6:
    add(f1_5.part)

    # F2_t45: cut F2_tool46
    add(f2_tool46.part, mode=Mode.SUBTRACT)


with BuildPart() as f2_tool52:
    # F2_s53 → F2_t54 (new body)
    with BuildSketch(Plane.XY.offset(5.08)):
        Polygon((7.523230961, 2.946635029), (12.588761929, 2.5634953517), (12.7732722731, 5.0029264966), (10.9810885225, 6.6681429337), align=None)
    extrude(amount=-F2_T54_DEPTH)

    # F2_s55 → F2_t56 (revolve, cut)
    with BuildSketch(Plane(origin=(7.523230961, 2.946635029, 5.08), x_dir=(-0.9311267278, -0.3646957865, 0), z_dir=(0.3646957865, -0.9311267278, 0))):
        with BuildLine():
            ThreePointArc((0, -5.08), (5.08, 0), (0, 5.08))
            Line((0, 5.08), (0, -5.08))
        make_face()
    revolve(axis=Axis((7.523230961, 2.946635029, 5.08), (0, 0, -1)), mode=Mode.SUBTRACT)


with BuildPart() as f1_7:
    add(f1_6.part)

    # F2_t51: cut F2_tool52
    add(f2_tool52.part, mode=Mode.SUBTRACT)


with BuildPart() as f2_tool58:
    # F2_s59 → F2_t60 (new body)
    with BuildSketch(Plane.XY.offset(7.92)):
        Polygon((7.523230961, 2.946635029), (12.588761929, 2.5634953517), (12.7732722731, 5.0029264966), (10.9810885225, 6.6681429337), align=None)
    extrude(amount=F2_T60_DEPTH)

    # F2_s61 → F2_t62 (revolve, cut)
    with BuildSketch(Plane(origin=(7.523230961, 2.946635029, 7.92), x_dir=(-0.9311267278, -0.3646957865, 0), z_dir=(-0.3646957865, 0.9311267278, 0))):
        with BuildLine():
            ThreePointArc((0, -5.08), (5.08, 0), (0, 5.08))
            Line((0, 5.08), (0, -5.08))
        make_face()
    revolve(axis=Axis((7.523230961, 2.946635029, 7.92), (0, 0, 1)), mode=Mode.SUBTRACT)


with BuildPart() as f1_8:
    add(f1_7.part)

    # F2_t57: cut F2_tool58
    add(f2_tool58.part, mode=Mode.SUBTRACT)

    # F2_s63 → F2_t64 (revolve, cut)
    with BuildSketch(Plane.XZ):
        with BuildLine():
            ThreePointArc((8, 5.08), (9.4878975516, 1.4878975516), (13.08, 0))
            Line((13.08, 0), (8, 0))
            Line((8, 0), (8, 5.08))
        make_face()
    revolve(axis=Axis((0, 0, 0), (0, 0, 1)), mode=Mode.SUBTRACT)

    # F2_s65 → F2_t66 (revolve, cut)
    with BuildSketch(Plane.XZ):
        with BuildLine():
            ThreePointArc((8, 7.92), (9.4878975516, 11.5121024484), (13.08, 13))
            Line((13.08, 13), (8, 13))
            Line((8, 13), (8, 7.92))
        make_face()
    revolve(axis=Axis((0, 0, 13), (0, 0, 1)), mode=Mode.SUBTRACT)


solid = f1_8.part
